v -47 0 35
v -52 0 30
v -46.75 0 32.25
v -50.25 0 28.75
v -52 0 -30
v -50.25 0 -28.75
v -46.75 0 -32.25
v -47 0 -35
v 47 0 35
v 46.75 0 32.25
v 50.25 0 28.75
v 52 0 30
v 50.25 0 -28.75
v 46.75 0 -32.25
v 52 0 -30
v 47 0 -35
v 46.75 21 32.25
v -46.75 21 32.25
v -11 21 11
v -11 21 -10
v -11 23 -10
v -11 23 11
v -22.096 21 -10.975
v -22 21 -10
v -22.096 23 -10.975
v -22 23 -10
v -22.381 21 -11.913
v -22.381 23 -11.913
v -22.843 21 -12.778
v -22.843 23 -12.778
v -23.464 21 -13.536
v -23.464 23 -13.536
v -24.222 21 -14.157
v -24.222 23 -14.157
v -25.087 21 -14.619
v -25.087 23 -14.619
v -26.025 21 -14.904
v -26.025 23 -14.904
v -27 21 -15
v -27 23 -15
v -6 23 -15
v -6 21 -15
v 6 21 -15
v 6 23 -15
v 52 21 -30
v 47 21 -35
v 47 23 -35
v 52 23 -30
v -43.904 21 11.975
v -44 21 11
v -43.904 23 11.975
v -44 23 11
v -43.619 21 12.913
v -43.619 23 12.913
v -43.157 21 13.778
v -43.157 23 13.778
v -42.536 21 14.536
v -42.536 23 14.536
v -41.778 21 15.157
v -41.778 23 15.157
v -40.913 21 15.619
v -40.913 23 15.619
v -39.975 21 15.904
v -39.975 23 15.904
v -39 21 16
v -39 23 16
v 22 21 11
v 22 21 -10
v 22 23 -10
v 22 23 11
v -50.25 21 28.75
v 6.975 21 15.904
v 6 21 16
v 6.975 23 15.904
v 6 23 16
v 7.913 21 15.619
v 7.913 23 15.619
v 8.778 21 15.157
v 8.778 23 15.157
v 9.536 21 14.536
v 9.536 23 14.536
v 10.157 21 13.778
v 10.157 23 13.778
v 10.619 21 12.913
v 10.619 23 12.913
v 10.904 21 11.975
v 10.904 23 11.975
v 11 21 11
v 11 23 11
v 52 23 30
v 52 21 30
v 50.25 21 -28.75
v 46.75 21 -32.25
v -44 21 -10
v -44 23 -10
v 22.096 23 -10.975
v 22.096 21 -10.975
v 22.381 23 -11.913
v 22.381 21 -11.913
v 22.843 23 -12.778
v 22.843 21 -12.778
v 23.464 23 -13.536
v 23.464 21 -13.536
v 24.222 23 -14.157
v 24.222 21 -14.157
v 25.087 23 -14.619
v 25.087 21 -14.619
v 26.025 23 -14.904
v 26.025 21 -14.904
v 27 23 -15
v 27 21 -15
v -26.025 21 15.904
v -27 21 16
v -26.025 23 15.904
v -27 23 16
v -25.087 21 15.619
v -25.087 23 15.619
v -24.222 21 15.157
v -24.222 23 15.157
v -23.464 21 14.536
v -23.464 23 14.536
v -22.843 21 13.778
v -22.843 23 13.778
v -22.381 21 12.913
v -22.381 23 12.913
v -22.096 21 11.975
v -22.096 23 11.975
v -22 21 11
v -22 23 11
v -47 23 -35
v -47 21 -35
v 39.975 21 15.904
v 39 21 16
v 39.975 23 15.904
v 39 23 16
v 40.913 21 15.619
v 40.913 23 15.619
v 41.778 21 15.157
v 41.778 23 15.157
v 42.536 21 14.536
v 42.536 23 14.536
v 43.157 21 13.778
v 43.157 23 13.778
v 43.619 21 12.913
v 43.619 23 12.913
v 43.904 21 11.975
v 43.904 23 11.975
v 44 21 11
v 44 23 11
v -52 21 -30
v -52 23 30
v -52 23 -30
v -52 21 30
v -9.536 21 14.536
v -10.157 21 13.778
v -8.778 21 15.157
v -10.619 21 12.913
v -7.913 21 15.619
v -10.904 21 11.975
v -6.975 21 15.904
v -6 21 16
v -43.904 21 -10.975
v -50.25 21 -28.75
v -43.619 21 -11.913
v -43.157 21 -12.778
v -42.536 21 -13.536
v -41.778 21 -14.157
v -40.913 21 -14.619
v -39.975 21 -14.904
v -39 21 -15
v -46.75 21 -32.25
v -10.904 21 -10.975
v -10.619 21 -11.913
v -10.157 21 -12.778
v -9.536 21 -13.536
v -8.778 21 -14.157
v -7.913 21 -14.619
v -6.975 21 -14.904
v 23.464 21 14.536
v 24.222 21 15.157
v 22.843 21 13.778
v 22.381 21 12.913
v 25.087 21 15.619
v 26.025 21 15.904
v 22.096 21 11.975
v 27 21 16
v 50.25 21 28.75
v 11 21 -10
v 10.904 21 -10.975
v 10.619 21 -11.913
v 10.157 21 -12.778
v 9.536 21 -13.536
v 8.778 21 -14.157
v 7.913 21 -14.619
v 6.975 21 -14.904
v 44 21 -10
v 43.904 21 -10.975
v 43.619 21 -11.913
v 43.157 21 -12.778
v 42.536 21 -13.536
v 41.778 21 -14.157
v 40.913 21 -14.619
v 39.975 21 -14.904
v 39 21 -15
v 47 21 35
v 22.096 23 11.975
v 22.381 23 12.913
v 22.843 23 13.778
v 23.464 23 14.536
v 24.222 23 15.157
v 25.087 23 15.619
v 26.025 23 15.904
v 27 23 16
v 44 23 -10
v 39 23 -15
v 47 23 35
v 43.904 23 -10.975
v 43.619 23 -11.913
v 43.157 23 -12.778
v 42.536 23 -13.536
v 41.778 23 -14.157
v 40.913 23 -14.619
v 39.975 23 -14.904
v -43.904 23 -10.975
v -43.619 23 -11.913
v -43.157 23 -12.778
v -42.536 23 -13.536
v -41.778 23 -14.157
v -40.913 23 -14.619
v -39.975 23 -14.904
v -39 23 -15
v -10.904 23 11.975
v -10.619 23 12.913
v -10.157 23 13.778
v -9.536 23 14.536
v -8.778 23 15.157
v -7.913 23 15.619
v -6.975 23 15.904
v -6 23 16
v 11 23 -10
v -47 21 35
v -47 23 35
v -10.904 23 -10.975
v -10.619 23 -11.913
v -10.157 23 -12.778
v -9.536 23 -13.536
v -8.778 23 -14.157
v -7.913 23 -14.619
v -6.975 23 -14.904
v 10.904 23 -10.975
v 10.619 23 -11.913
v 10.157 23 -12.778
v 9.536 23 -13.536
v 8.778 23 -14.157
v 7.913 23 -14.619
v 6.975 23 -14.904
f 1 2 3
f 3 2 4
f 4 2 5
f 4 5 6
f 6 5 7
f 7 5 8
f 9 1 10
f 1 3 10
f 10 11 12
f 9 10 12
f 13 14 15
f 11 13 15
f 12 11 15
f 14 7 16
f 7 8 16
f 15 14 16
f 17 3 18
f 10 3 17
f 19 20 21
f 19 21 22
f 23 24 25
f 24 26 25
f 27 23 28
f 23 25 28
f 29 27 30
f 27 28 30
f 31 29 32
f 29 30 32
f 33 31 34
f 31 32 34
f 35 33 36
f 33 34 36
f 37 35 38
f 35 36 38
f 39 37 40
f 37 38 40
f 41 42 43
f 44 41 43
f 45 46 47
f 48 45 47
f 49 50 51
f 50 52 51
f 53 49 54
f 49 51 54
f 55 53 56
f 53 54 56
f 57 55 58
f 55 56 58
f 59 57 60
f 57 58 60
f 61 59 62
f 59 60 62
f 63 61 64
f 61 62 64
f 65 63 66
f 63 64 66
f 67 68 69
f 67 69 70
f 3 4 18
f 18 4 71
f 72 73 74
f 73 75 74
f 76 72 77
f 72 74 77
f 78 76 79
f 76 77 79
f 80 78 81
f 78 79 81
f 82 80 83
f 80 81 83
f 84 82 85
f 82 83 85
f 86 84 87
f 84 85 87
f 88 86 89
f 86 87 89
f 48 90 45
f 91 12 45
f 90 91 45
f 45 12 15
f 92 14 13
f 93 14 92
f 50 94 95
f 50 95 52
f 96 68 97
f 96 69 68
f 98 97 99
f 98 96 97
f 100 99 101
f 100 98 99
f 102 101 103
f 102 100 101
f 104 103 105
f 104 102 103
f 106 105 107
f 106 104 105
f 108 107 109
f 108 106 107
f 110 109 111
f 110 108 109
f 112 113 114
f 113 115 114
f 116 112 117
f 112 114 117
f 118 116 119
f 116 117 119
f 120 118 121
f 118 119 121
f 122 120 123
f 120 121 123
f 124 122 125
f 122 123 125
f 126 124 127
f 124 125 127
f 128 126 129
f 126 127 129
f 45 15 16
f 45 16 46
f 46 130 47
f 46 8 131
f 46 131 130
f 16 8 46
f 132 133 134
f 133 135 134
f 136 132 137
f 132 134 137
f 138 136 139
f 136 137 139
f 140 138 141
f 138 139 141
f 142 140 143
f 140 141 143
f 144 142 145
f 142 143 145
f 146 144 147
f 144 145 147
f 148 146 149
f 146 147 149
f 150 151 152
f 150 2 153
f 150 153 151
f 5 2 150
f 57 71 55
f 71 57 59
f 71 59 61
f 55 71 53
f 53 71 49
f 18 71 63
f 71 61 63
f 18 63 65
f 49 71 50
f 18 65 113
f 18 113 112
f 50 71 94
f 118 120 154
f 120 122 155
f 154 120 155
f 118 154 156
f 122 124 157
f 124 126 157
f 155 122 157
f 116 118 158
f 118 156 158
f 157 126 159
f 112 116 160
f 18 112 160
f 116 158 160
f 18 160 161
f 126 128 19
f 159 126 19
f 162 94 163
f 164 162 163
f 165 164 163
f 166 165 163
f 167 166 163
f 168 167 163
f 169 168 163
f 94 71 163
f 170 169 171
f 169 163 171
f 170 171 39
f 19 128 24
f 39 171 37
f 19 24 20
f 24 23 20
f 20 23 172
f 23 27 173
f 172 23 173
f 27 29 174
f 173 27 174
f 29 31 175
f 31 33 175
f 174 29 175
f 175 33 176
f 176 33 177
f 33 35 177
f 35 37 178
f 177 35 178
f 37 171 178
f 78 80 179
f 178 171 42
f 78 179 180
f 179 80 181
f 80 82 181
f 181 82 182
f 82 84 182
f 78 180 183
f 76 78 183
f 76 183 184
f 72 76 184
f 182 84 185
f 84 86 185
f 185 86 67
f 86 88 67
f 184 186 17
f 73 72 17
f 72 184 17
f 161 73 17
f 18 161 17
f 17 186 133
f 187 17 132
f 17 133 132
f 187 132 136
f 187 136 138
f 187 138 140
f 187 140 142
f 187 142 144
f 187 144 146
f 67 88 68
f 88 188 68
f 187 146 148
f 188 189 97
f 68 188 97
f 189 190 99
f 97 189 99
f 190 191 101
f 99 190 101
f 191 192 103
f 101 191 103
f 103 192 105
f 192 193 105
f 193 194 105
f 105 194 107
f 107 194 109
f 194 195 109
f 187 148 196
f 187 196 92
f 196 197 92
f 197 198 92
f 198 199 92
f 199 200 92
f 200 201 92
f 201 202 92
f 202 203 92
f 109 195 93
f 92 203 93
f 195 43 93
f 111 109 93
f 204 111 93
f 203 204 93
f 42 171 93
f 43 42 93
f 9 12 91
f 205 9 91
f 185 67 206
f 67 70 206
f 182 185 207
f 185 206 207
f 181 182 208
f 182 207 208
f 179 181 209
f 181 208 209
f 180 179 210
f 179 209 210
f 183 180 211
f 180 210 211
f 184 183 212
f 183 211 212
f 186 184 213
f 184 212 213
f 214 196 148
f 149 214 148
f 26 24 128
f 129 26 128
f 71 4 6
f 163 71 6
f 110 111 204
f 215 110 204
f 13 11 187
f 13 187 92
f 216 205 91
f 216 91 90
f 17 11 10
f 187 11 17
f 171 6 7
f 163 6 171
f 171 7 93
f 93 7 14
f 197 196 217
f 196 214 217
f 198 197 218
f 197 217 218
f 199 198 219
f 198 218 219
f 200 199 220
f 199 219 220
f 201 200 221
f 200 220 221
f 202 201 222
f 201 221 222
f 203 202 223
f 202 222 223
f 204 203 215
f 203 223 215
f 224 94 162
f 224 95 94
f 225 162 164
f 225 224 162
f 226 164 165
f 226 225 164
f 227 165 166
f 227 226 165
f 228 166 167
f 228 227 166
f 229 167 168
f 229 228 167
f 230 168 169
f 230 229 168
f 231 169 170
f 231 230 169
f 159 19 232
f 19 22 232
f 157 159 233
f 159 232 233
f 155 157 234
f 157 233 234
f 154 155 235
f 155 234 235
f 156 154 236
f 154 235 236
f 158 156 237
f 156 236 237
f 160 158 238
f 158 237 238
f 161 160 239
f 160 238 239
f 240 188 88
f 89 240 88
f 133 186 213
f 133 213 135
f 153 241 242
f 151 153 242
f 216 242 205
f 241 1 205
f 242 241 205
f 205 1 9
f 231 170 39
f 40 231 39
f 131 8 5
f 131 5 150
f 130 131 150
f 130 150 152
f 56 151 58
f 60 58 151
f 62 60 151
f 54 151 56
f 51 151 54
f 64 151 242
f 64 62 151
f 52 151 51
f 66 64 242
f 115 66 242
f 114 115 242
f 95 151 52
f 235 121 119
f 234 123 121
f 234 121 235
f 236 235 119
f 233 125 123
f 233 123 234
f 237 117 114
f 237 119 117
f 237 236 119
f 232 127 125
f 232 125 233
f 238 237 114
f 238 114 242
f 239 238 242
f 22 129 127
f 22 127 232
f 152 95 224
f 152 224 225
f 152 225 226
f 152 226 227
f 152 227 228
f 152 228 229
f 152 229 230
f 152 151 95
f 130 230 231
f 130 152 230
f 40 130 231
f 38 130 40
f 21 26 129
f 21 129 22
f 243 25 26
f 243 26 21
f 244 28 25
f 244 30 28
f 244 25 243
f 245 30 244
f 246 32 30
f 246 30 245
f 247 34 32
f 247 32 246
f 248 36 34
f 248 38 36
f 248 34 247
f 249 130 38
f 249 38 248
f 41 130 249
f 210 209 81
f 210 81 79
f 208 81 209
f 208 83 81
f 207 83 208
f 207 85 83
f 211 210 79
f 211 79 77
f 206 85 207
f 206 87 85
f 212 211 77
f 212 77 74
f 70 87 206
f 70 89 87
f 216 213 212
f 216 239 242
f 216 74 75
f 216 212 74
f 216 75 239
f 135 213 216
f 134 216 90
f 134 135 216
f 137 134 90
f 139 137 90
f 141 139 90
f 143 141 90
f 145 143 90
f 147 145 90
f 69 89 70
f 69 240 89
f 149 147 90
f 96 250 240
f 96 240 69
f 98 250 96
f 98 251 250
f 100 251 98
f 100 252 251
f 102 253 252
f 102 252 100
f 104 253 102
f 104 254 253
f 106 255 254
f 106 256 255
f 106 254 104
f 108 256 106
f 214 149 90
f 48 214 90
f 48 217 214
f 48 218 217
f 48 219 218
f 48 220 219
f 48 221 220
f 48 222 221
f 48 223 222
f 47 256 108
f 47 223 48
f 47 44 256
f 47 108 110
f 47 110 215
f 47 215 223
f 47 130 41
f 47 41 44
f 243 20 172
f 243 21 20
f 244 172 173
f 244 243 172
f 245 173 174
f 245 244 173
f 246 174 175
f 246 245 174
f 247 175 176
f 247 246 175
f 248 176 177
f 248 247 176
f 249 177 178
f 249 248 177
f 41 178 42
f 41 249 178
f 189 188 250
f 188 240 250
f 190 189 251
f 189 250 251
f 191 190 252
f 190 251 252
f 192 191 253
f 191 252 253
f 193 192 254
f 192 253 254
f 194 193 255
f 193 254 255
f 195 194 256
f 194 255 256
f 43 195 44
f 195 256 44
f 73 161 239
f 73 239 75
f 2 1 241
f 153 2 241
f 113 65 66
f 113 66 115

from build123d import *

# Parameters (mm, degrees)
SKETCH1_W           = 104
SKETCH1_H           = 70
SKETCH1_W_2         = 100.5
SKETCH1_H_2         = 64.5
BOSS_EXTRUDE1_DEPTH = 21
CHAMFER2_SIZE       = 3.5
CHAMFER3_SIZE       = 5
SKETCH3_W           = 104
SKETCH3_H           = 70
BOSS_EXTRUDE2_DEPTH = 2
CHAMFER4_SIZE       = 5
SKETCH4_W           = 22
SKETCH4_H           = 31
CUT_EXTRUDE1_DEPTH  = 2
FILLET1_R           = 5


with BuildPart() as part:
    # Sketch1 → Boss-Extrude1 (new body)
    with BuildSketch(Plane(origin=(0, 0, 0), x_dir=(1, 0, 0), z_dir=(0, 1, 0))):
        Rectangle(SKETCH1_W, SKETCH1_H)
        Rectangle(SKETCH1_W_2, SKETCH1_H_2, mode=Mode.SUBTRACT)
    extrude(amount=BOSS_EXTRUDE1_DEPTH)

    # Chamfer2
    chamfer2_edges = [part.edges().sort_by_distance(p)[0] for p in [
        (50.25, 10.5, 32.25),
        (50.25, 10.5, -32.25),
        (-50.25, 10.5, -32.25),
        (-50.25, 10.5, 32.25),
    ]]
    chamfer(chamfer2_edges, length=CHAMFER2_SIZE)

    # Chamfer3
    chamfer3_edges = [part.edges().sort_by_distance(p)[0] for p in [
        (52, 10.5, 35),
        (-52, 10.5, 35),
        (-52, 10.5, -35),
        (52, 10.5, -35),
    ]]
    chamfer(chamfer3_edges, length=CHAMFER3_SIZE)

    # Sketch3 → Boss-Extrude2 (add)
    with BuildSketch(Plane(origin=(0, 21, 0), x_dir=(1, 0, 0), z_dir=(0, 1, 0))):
        Rectangle(SKETCH3_W, SKETCH3_H)
    extrude(amount=BOSS_EXTRUDE2_DEPTH)

    # Chamfer4
    chamfer4_edges = [part.edges().sort_by_distance(p)[0] for p in [
        (-52, 22, 35),
        (52, 22, 35),
        (52, 22, -35),
        (-52, 22, -35),
    ]]
    chamfer(chamfer4_edges, length=CHAMFER4_SIZE - 0.0001)  # a hair under: the kernel refuses the full size

    # Sketch4 → Cut-Extrude1 (cut)
    with BuildSketch(Plane.XZ.offset(-21)):
        with Locations((0, 0.5)):
            Rectangle(SKETCH4_W, SKETCH4_H)
        with Locations((33, 0.5)):
            Rectangle(SKETCH4_W, SKETCH4_H)
        with Locations((-33, 0.5)):
            Rectangle(SKETCH4_W, SKETCH4_H)
    extrude(amount=-CUT_EXTRUDE1_DEPTH, mode=Mode.SUBTRACT)

    # Fillet1
    fillet1_edges = [part.edges().sort_by_distance(p)[0] for p in [
        (-11, 22, -15),
        (-11, 22, 16),
        (11, 22, 16),
        (11, 22, -15),
        (22, 22, -15),
        (22, 22, 16),
        (44, 22, 16),
        (44, 22, -15),
        (-22, 22, 16),
        (-22, 22, -15),
        (-44, 22, -15),
        (-44, 22, 16),
    ]]
    fillet(fillet1_edges, radius=FILLET1_R)


solid = part.part
